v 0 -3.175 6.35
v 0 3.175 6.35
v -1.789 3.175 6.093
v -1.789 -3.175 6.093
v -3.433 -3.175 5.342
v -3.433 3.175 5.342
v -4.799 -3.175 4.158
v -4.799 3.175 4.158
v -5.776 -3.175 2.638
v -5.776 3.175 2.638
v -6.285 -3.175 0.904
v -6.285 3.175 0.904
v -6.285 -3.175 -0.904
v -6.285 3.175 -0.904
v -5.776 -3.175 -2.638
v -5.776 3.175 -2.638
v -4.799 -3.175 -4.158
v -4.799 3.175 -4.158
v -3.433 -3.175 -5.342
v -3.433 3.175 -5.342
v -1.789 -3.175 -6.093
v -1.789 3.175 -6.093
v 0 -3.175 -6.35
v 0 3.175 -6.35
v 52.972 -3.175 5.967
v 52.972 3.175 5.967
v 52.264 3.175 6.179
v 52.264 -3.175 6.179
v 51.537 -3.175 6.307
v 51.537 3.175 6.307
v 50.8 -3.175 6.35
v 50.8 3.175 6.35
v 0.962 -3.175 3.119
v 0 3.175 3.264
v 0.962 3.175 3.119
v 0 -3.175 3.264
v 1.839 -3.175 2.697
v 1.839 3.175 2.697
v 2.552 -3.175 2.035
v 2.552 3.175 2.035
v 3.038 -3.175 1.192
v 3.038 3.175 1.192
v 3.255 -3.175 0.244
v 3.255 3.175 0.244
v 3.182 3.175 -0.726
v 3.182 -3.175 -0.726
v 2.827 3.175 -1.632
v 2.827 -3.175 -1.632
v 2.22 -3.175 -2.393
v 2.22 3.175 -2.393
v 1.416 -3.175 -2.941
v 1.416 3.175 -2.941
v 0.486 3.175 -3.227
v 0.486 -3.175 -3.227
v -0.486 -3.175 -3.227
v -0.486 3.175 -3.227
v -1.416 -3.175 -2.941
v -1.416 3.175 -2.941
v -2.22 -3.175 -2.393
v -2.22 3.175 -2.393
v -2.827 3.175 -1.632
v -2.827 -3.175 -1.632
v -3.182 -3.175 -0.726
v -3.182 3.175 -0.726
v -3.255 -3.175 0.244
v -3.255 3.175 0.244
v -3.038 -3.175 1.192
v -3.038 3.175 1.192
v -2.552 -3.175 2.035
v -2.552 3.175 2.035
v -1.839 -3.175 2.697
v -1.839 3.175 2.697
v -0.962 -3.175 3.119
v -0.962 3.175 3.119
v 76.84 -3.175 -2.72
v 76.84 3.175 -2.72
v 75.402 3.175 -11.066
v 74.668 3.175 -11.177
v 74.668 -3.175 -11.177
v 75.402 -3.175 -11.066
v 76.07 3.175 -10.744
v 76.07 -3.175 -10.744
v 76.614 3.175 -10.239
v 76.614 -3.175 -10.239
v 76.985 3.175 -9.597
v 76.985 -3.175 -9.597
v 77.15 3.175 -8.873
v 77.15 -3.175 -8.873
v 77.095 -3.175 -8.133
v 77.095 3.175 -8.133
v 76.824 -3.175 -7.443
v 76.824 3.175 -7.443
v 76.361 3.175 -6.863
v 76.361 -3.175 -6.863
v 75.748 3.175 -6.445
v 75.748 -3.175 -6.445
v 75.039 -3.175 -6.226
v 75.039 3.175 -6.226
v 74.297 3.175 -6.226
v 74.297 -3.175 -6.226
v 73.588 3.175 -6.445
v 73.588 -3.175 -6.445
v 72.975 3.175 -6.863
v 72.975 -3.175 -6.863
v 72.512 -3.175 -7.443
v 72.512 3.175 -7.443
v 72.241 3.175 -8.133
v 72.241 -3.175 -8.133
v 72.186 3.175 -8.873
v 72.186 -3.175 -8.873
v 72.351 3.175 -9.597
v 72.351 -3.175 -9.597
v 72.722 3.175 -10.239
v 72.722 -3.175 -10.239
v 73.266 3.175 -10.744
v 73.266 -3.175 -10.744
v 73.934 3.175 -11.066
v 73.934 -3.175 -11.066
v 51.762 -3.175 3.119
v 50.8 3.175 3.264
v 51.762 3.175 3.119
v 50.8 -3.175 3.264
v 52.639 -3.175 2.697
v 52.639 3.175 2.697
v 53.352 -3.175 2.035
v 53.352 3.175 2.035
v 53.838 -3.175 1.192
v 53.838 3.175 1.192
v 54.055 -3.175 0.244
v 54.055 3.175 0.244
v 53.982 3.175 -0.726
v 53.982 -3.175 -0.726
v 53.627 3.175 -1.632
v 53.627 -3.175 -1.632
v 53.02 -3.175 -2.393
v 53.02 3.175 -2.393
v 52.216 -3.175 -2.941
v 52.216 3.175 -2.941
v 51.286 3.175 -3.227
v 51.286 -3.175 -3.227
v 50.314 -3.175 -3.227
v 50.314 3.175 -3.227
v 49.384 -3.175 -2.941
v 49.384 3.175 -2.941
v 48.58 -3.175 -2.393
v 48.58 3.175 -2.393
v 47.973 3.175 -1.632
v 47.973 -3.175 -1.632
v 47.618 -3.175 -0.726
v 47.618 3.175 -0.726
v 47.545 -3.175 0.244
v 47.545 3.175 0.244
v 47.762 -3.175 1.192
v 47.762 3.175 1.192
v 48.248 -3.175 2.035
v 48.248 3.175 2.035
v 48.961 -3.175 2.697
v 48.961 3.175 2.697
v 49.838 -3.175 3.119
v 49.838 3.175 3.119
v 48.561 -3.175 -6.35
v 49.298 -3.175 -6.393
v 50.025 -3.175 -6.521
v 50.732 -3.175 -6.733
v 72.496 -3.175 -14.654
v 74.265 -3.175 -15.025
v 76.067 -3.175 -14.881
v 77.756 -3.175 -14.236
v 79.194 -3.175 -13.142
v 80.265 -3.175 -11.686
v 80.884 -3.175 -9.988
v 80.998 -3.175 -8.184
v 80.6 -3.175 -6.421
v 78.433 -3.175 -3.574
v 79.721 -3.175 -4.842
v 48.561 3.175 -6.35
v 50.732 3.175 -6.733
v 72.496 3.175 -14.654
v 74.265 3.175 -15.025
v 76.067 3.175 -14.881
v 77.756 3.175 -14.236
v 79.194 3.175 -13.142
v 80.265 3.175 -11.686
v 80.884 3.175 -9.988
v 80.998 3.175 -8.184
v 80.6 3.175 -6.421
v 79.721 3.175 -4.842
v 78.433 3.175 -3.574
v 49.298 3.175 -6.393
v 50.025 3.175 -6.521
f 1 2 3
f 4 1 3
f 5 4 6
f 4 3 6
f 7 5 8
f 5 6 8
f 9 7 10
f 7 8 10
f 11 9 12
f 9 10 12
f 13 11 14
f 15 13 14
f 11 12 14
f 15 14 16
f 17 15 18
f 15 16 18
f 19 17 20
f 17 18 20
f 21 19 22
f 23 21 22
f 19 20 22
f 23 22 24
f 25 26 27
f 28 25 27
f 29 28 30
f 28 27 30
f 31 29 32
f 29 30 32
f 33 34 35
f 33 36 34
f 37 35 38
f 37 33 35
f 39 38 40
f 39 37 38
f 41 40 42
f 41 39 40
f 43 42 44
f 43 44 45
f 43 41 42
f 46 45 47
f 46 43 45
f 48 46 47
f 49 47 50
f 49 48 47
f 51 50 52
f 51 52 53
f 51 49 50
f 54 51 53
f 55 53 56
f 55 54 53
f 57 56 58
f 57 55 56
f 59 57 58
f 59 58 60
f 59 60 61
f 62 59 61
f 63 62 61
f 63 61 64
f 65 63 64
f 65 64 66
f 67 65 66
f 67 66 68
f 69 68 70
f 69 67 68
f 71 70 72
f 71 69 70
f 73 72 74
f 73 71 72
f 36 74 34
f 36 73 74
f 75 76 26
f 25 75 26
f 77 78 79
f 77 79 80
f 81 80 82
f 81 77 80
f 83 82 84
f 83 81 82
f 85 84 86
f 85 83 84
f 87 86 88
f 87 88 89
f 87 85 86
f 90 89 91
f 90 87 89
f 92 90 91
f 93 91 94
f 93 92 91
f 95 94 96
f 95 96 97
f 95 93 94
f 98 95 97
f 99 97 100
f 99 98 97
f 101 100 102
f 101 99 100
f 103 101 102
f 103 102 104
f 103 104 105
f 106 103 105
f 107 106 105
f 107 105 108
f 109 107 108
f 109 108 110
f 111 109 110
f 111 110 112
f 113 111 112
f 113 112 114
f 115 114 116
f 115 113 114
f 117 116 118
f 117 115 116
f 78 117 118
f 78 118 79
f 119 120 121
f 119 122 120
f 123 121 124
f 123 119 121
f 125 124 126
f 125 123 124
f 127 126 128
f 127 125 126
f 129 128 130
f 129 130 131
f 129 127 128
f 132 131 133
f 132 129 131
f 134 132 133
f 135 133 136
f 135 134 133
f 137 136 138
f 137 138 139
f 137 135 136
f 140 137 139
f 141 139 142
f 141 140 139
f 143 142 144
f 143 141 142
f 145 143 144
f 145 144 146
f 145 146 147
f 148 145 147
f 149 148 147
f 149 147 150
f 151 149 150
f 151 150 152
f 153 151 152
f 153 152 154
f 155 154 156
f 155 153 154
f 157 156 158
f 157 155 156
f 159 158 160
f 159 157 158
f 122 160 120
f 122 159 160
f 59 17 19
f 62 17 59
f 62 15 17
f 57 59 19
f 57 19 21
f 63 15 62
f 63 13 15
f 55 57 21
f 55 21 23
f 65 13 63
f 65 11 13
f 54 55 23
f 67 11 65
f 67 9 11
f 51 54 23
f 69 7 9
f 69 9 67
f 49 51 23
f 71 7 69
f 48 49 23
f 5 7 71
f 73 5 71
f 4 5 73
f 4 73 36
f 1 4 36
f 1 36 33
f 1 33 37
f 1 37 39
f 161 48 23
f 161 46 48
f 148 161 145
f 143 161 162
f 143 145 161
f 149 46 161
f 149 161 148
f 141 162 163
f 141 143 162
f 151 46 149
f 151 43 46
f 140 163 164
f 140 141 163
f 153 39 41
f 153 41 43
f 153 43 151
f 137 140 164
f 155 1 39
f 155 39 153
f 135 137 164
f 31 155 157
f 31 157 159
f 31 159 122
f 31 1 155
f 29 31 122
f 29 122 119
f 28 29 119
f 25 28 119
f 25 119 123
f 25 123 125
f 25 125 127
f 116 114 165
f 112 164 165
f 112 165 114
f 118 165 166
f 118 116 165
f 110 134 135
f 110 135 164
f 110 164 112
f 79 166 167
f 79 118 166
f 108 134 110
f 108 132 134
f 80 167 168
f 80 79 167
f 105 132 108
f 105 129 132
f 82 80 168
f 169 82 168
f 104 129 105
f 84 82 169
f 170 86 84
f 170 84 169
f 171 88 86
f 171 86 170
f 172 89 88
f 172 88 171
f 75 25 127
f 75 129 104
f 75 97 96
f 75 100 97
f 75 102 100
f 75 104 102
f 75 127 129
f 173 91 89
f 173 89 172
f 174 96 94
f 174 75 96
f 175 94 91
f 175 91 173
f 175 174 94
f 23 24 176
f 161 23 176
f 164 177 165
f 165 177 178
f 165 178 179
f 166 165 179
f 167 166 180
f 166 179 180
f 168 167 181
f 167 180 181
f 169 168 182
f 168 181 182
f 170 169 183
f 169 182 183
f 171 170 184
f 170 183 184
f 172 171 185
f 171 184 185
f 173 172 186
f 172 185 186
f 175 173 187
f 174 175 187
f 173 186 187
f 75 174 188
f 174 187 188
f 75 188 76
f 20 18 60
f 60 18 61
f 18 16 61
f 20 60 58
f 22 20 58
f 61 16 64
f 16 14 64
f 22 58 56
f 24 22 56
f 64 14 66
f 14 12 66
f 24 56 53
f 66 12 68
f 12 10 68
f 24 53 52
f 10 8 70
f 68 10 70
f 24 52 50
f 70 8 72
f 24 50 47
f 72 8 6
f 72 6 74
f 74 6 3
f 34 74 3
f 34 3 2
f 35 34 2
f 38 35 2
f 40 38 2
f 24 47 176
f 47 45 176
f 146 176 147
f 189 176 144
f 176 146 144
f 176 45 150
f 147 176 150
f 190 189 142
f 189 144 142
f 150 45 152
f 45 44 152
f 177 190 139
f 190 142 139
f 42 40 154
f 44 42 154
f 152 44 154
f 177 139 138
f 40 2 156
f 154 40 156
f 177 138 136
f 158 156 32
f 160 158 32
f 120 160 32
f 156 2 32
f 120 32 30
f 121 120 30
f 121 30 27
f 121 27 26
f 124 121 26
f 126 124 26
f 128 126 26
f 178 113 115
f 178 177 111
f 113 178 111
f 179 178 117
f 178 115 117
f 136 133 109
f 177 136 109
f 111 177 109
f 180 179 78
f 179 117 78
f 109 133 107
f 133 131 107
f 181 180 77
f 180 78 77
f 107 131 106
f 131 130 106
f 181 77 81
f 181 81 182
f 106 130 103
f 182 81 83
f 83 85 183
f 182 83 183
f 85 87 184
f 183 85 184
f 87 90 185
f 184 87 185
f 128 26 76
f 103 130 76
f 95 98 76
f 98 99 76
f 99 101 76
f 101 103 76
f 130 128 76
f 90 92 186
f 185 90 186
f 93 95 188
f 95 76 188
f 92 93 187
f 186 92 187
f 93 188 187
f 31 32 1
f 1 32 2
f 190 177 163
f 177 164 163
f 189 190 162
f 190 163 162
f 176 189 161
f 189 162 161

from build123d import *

# Parameters (mm, degrees)
SKETCH1_R           = 3.2639
BOSS_EXTRUDE1_DEPTH = 3.175
BOSS_EXTRUDE2_START = -6.35
SKETCH3_R           = 2.4892
BOSS_EXTRUDE2_DEPTH = 6.35
FILLET2_R           = 6.35


with BuildPart() as part:
    # Sketch1 → Boss-Extrude1 (new, symmetric)
    with BuildSketch(Plane(origin=(0, 0, 0), x_dir=(1, 0, 0), z_dir=(0, 1, 0))):
        with BuildLine():
            Line((0, 6.35), (50.8, 6.35))
            ThreePointArc((50.8, 6.35), (57.15, 0), (50.8, -6.35))
            Line((50.8, -6.35), (0, -6.35))
            ThreePointArc((0, -6.35), (-6.35, 0), (0, 6.35))
        make_face()
        with Locations(Location((0, 0, 0), (0, 0, 270))):
            Circle(SKETCH1_R, mode=Mode.SUBTRACT)
        with Locations(Location((50.8, 0, 0), (0, 0, 270))):
            Circle(SKETCH1_R, mode=Mode.SUBTRACT)
    extrude(amount=BOSS_EXTRUDE1_DEPTH, both=True)

    # Sketch3 → Boss-Extrude2 (add)
    with BuildSketch(Plane.XZ.offset(3.175).offset(BOSS_EXTRUDE2_START)):
        with BuildLine():
            Line((76.840020478, -2.720263498), (52.97182791, 5.967048142))
            ThreePointArc((52.97182791, 5.967048142), (57.053529232, -1.102665928), (50.8, -6.35))
            Line((50.8, -6.35), (49.680323673, -6.35))
            Line((49.680323673, -6.35), (72.496364658, -14.654359782))
            ThreePointArc((72.496364658, -14.654359782), (80.63524071, -10.859139551), (76.840020478, -2.720263498))
        make_face()
        with Locations(Location((74.668192568, -8.68731164, 0), (0, 0, 270))):
            Circle(SKETCH3_R, mode=Mode.SUBTRACT)
    extrude(amount=BOSS_EXTRUDE2_DEPTH)

    # Fillet2
    fillet2_edges = [part.edges().sort_by_distance(p)[0] for p in [
        (49.680323673, 0, -6.35),
    ]]
    fillet(fillet2_edges, radius=FILLET2_R)


solid = part.part
